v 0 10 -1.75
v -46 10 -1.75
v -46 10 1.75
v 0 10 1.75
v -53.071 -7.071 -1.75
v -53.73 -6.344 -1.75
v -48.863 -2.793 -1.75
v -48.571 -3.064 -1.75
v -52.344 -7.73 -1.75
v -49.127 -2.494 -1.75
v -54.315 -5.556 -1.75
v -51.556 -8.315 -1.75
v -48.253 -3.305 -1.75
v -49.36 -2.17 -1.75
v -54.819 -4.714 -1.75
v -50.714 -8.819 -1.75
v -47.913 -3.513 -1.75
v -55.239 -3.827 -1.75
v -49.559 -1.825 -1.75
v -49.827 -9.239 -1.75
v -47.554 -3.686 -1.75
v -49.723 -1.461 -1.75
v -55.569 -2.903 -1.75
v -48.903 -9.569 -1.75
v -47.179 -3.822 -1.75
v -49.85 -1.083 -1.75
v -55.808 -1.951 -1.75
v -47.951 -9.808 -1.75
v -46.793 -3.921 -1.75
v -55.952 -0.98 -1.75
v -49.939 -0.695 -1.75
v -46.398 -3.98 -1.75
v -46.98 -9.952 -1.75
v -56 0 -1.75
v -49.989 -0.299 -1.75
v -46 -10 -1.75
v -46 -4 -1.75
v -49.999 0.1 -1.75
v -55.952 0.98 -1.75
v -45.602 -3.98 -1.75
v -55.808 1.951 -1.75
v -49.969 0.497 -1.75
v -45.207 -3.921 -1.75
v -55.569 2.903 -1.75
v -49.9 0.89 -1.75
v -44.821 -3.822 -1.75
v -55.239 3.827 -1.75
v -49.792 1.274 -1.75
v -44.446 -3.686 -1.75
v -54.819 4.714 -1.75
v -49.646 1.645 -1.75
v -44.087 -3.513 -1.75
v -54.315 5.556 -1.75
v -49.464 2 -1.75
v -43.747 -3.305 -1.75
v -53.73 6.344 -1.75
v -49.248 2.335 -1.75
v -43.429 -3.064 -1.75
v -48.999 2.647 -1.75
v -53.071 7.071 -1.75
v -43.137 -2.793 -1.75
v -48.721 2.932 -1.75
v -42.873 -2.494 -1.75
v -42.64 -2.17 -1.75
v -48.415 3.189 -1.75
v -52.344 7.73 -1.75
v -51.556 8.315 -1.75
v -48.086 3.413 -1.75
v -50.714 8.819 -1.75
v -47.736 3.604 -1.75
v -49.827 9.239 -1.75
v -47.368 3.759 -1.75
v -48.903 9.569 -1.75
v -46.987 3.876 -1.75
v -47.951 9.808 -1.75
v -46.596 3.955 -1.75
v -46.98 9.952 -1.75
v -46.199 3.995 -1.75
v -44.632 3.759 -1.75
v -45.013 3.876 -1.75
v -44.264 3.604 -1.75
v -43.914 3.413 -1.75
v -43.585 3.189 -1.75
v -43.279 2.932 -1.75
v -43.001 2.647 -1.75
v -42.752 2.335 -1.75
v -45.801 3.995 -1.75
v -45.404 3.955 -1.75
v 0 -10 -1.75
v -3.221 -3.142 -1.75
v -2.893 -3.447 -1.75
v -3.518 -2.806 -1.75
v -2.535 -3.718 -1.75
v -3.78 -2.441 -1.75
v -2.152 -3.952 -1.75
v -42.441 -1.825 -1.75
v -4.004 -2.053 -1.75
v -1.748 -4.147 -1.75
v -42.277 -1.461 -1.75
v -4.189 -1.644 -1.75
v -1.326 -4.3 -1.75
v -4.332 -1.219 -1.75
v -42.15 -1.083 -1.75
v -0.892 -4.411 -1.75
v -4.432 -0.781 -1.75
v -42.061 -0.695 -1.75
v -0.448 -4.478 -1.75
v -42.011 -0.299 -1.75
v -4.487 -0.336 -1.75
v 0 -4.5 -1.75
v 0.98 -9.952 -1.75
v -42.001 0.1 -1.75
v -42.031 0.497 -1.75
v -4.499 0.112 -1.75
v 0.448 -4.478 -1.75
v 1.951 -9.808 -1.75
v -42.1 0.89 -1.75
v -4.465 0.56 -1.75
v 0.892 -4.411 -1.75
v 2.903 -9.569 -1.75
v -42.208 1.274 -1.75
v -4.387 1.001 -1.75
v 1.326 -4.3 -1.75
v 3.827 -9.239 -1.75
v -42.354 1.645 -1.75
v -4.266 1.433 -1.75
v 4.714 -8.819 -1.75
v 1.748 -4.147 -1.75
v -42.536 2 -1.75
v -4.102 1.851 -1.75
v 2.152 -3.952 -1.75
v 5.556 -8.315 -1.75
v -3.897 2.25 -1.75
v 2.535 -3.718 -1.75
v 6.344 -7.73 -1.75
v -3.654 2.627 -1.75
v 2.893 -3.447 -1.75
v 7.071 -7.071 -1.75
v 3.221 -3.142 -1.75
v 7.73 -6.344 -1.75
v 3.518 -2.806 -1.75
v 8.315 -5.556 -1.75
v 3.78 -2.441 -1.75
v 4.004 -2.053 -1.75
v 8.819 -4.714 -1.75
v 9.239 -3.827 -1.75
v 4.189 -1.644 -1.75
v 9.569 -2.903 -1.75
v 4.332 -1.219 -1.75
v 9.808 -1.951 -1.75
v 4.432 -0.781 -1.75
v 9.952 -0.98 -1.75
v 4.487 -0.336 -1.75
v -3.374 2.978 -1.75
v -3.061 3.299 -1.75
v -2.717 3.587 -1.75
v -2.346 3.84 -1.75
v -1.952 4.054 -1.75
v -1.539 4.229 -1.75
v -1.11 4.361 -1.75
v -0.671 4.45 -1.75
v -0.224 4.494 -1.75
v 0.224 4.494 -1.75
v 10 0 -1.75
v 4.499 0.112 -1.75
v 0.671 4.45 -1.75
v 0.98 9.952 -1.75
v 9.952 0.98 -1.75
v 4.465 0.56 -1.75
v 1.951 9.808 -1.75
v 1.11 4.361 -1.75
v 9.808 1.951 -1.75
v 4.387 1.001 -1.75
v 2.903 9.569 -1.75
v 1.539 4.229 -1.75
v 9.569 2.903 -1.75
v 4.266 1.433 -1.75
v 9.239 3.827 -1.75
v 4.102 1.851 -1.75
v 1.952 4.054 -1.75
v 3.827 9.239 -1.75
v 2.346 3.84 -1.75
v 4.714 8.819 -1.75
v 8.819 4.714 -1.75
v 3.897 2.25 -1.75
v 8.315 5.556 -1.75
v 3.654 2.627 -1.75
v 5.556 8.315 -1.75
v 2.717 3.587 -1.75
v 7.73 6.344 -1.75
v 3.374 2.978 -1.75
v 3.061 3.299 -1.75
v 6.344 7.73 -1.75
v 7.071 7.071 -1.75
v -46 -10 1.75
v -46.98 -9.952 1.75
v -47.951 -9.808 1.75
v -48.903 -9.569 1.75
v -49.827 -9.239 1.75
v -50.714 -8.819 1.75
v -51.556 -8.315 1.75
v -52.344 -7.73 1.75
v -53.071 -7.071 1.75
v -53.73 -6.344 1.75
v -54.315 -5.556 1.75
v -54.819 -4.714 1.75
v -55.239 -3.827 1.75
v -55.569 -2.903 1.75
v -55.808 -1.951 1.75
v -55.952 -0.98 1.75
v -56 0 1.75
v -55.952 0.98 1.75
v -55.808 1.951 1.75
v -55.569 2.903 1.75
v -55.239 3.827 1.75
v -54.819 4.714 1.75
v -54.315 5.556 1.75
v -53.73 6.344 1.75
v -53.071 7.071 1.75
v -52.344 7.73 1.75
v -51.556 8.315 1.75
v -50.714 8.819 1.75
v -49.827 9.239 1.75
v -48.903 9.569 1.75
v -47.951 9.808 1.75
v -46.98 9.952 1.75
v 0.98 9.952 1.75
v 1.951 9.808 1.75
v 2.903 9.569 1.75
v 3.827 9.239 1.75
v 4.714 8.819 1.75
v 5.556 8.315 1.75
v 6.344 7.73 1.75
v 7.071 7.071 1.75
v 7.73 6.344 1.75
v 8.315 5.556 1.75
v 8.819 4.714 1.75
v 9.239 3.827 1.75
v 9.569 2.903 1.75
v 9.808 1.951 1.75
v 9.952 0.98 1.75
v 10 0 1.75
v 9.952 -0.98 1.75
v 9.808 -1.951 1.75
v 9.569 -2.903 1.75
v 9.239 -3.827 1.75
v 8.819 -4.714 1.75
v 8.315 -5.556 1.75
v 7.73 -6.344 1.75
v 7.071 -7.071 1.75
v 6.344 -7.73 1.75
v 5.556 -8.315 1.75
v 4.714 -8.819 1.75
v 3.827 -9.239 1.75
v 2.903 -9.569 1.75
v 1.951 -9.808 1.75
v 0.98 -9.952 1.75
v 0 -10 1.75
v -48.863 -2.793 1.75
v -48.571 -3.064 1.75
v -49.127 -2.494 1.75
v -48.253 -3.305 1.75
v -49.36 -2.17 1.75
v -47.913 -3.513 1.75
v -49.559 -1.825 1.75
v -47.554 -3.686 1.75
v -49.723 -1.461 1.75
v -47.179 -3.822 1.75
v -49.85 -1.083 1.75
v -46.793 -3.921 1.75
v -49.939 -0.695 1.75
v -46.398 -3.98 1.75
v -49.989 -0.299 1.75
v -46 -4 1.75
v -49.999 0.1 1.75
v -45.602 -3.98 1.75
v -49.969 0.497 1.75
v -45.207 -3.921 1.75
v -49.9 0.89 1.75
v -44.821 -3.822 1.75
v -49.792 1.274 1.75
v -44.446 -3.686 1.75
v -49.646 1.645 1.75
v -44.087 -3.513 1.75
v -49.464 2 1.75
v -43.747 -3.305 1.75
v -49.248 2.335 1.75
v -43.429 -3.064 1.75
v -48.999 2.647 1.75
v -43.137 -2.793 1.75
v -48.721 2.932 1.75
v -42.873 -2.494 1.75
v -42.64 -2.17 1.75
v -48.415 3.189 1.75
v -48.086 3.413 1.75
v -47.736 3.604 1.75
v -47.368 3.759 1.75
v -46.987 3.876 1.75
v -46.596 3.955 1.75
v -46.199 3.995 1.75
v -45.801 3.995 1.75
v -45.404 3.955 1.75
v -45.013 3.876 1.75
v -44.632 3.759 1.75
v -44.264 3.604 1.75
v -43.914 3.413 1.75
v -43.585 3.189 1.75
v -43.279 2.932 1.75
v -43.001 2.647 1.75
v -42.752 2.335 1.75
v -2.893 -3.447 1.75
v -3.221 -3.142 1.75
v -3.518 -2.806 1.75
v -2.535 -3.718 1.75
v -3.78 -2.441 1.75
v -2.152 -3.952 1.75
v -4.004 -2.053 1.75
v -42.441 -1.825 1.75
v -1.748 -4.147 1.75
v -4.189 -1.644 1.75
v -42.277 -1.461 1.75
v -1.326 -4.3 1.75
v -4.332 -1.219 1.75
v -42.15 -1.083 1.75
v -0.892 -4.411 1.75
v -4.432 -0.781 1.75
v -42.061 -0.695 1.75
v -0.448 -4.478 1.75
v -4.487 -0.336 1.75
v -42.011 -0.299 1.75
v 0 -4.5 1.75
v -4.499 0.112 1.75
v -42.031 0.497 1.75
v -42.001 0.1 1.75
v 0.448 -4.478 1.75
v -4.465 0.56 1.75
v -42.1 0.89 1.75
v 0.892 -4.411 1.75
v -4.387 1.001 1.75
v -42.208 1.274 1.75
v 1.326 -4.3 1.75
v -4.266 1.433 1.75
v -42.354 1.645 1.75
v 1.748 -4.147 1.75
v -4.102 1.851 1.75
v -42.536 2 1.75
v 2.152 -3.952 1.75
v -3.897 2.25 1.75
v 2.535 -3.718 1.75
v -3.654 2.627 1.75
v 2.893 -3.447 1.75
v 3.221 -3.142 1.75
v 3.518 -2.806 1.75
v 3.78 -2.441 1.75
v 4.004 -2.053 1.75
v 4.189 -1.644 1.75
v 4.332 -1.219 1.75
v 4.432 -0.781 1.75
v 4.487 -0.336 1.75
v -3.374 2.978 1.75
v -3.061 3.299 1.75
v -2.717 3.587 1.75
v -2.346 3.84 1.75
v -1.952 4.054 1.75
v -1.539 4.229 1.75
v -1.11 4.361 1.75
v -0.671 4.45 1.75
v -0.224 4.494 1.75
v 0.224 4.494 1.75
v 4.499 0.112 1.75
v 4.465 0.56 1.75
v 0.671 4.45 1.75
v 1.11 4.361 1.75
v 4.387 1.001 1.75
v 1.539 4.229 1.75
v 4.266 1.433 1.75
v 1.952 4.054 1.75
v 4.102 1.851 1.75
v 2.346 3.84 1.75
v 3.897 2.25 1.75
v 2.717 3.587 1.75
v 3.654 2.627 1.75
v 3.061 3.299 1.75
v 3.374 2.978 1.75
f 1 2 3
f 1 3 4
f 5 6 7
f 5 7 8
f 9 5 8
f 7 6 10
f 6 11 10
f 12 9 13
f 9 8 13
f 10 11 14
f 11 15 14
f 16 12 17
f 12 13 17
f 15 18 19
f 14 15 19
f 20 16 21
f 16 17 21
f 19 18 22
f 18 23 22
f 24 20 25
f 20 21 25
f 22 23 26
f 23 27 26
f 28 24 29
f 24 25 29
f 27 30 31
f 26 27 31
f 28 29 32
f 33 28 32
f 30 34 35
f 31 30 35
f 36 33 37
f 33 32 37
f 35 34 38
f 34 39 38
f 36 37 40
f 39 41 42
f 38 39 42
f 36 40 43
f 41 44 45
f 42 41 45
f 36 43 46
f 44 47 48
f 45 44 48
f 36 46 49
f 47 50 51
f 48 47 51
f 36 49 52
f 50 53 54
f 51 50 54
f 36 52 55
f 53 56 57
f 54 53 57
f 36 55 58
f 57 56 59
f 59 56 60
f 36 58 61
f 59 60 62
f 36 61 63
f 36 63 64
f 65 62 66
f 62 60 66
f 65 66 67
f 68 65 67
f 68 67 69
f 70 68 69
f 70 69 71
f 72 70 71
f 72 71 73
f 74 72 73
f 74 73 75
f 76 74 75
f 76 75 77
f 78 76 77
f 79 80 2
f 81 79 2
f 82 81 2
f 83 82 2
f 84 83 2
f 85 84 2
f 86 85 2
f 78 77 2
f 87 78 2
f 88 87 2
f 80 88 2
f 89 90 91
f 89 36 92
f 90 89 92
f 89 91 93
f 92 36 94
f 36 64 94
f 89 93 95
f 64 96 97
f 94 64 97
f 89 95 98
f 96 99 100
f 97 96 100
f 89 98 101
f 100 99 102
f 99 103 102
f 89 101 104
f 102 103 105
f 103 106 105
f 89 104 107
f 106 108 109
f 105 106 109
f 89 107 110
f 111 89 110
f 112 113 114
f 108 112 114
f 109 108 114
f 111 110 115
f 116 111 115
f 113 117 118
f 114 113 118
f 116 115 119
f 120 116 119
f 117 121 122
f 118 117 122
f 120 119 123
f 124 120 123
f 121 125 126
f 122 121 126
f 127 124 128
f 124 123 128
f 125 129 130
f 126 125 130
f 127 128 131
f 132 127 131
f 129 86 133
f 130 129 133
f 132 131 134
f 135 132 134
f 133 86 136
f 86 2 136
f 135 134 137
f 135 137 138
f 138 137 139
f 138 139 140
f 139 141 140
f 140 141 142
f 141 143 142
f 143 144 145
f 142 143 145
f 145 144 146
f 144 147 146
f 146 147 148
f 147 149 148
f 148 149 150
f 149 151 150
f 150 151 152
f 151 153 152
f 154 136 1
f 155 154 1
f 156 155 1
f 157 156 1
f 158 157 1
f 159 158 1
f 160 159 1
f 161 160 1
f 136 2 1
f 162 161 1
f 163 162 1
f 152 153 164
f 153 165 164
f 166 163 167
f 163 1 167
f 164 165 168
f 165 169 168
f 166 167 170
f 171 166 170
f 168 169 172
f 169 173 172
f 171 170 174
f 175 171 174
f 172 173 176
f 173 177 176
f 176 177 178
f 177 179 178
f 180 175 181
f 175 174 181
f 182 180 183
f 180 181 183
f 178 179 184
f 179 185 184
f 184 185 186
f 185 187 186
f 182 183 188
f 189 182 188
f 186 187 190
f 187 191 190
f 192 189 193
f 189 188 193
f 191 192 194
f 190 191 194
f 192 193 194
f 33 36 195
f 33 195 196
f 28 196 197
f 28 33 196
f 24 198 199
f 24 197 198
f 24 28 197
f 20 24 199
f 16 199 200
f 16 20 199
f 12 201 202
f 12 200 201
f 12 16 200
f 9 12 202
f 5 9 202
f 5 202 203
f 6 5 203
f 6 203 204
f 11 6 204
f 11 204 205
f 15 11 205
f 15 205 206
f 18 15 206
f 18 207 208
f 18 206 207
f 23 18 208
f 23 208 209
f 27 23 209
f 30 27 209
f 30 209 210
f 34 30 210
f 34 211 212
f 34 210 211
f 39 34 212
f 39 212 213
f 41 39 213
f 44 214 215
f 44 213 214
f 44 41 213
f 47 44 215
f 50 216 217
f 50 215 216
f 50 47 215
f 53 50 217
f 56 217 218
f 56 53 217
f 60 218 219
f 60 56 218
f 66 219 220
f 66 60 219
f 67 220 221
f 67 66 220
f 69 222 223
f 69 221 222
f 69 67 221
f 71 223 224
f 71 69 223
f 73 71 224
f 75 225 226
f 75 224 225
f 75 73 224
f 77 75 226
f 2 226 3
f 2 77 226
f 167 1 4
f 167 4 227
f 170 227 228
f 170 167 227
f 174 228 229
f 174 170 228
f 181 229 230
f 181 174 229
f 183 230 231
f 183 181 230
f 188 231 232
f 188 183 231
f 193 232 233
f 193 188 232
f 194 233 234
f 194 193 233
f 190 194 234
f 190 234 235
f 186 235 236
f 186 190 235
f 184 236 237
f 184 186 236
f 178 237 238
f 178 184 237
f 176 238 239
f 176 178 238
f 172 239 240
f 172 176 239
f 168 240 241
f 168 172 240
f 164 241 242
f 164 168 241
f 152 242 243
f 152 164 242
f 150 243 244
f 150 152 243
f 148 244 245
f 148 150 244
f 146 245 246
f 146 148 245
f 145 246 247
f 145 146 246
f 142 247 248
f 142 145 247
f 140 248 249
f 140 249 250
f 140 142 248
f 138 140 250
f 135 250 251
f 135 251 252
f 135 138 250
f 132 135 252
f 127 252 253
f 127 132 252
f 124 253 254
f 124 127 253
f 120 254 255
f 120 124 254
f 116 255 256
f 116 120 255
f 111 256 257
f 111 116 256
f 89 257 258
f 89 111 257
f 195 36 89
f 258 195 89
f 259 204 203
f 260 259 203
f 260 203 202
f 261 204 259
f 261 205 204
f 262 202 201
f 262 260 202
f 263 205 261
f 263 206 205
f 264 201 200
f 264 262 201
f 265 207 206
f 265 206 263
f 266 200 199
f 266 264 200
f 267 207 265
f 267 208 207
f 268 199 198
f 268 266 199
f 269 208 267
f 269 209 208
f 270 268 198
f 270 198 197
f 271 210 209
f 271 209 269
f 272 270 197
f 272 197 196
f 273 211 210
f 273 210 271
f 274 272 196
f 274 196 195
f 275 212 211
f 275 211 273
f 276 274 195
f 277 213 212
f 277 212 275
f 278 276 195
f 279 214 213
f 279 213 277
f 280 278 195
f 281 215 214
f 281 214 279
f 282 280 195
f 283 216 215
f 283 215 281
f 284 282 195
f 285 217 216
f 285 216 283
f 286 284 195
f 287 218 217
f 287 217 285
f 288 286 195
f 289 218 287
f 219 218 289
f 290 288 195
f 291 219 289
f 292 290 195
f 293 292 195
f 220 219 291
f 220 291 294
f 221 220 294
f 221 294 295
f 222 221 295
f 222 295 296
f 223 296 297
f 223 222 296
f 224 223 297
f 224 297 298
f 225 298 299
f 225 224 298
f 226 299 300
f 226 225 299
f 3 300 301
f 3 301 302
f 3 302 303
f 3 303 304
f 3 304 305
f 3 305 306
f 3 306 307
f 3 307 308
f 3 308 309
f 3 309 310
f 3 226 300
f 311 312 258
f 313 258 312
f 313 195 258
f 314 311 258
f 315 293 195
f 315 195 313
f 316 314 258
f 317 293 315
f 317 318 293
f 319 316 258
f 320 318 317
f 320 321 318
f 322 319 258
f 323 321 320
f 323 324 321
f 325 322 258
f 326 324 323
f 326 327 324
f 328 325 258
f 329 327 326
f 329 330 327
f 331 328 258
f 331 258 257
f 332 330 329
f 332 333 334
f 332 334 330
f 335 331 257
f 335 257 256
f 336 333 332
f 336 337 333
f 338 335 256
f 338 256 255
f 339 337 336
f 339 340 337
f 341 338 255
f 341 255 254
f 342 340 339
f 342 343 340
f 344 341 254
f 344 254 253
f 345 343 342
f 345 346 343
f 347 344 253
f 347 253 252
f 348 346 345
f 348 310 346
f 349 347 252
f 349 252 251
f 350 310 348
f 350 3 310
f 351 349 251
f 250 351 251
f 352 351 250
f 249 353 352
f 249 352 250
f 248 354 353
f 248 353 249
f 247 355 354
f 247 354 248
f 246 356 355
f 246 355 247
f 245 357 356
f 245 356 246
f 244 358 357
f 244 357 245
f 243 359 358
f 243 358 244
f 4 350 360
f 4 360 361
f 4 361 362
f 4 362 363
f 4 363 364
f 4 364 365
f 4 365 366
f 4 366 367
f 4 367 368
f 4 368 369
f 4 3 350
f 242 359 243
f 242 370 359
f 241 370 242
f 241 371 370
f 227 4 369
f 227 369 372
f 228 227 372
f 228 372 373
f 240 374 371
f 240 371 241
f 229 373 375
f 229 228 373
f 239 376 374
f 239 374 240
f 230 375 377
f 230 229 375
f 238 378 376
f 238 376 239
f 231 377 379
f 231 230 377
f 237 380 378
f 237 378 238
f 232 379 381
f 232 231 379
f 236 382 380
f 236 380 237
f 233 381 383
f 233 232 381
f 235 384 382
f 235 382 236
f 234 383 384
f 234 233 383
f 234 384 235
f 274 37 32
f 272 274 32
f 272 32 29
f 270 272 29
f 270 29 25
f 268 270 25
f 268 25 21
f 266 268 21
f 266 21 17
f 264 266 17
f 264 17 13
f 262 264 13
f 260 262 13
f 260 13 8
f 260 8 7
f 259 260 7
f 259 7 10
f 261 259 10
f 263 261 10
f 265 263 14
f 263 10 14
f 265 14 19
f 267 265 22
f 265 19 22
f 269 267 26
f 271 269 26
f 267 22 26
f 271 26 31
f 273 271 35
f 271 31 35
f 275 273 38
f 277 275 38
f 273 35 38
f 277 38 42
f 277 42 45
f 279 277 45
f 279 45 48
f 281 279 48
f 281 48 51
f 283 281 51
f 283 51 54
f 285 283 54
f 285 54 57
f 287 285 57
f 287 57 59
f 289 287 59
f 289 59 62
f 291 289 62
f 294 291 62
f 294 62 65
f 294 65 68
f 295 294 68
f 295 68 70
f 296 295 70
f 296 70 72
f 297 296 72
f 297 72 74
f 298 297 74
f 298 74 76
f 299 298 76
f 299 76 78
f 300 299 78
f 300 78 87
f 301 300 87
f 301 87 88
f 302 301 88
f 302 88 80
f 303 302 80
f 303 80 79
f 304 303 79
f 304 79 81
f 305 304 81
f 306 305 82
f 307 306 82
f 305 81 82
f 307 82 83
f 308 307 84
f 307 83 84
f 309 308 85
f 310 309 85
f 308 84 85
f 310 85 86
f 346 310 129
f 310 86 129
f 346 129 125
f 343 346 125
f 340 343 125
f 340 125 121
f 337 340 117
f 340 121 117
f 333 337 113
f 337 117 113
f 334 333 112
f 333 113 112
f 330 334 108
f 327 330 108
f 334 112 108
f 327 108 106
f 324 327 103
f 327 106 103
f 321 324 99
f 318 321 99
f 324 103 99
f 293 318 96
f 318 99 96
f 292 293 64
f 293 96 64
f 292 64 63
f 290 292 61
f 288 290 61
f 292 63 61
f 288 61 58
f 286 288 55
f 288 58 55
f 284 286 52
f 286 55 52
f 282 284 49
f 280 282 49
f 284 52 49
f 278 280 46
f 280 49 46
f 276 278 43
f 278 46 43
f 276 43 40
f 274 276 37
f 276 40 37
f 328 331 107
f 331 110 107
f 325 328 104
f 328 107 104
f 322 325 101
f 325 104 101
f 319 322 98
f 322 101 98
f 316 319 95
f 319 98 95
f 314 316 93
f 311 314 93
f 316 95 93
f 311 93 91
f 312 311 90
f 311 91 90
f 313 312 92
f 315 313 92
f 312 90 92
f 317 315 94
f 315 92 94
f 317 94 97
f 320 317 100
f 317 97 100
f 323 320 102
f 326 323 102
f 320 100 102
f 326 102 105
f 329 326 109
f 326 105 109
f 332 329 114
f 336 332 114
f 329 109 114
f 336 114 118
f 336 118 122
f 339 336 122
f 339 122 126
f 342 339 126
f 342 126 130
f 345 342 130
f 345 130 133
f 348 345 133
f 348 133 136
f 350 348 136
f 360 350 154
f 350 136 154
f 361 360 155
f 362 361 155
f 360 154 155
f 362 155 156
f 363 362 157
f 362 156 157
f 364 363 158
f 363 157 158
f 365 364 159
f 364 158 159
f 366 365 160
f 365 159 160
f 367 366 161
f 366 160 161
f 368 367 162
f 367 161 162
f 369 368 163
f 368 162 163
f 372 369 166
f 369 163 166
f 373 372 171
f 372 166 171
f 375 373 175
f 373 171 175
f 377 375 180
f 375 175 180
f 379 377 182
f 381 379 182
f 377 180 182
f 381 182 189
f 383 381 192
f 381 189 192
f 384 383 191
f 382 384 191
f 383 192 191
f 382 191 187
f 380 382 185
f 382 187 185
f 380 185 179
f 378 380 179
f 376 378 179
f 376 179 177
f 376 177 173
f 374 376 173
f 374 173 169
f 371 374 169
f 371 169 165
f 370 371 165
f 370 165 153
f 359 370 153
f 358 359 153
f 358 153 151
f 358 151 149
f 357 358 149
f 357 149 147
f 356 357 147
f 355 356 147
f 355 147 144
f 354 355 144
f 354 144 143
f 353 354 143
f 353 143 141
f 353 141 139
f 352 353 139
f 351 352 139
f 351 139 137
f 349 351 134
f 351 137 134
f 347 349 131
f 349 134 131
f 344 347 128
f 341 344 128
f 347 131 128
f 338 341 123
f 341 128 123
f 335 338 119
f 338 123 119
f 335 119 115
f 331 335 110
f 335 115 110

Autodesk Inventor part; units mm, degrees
ref_plane "YZ Plane" through (0, 0, 0) normal (1, 0, 0) x (0, 1, 0)
ref_plane "XZ Plane" through (0, 0, 0) normal (0, 1, 0) x (-1, 0, 0)
ref_plane "XY Plane" through (0, 0, 0) normal (0, 0, 1) x (1, 0, 0)
sketch "Sketch1" plane through (0, 0, 0) normal (0, 0, 1) x (1, 0, 0)
  circle A0 centre (0, 0) radius 10
  line L0 (0, 0) -> (-46, 0) construction
  circle A1 centre (-46, 0) radius 10
  line L1 (-46, 10) -> (0, 10)
  line L2 (-46, -10) -> (0, -10)
  dimension "d0" = 20
  dimension "d1" = 20
  dimension "d2" = 46
extrude "Extrusion1" add sketch "Sketch1" along normal mid plane 3.5
hole "Hole3" at (-46, 0, 1.75) direction (0, 0, -1) diameter 8 end through all
hole "Hole4" at (0, 0, 1.75) direction (0, 0, -1) diameter 9 end through all
properties part number "201-12" material "Steel"
